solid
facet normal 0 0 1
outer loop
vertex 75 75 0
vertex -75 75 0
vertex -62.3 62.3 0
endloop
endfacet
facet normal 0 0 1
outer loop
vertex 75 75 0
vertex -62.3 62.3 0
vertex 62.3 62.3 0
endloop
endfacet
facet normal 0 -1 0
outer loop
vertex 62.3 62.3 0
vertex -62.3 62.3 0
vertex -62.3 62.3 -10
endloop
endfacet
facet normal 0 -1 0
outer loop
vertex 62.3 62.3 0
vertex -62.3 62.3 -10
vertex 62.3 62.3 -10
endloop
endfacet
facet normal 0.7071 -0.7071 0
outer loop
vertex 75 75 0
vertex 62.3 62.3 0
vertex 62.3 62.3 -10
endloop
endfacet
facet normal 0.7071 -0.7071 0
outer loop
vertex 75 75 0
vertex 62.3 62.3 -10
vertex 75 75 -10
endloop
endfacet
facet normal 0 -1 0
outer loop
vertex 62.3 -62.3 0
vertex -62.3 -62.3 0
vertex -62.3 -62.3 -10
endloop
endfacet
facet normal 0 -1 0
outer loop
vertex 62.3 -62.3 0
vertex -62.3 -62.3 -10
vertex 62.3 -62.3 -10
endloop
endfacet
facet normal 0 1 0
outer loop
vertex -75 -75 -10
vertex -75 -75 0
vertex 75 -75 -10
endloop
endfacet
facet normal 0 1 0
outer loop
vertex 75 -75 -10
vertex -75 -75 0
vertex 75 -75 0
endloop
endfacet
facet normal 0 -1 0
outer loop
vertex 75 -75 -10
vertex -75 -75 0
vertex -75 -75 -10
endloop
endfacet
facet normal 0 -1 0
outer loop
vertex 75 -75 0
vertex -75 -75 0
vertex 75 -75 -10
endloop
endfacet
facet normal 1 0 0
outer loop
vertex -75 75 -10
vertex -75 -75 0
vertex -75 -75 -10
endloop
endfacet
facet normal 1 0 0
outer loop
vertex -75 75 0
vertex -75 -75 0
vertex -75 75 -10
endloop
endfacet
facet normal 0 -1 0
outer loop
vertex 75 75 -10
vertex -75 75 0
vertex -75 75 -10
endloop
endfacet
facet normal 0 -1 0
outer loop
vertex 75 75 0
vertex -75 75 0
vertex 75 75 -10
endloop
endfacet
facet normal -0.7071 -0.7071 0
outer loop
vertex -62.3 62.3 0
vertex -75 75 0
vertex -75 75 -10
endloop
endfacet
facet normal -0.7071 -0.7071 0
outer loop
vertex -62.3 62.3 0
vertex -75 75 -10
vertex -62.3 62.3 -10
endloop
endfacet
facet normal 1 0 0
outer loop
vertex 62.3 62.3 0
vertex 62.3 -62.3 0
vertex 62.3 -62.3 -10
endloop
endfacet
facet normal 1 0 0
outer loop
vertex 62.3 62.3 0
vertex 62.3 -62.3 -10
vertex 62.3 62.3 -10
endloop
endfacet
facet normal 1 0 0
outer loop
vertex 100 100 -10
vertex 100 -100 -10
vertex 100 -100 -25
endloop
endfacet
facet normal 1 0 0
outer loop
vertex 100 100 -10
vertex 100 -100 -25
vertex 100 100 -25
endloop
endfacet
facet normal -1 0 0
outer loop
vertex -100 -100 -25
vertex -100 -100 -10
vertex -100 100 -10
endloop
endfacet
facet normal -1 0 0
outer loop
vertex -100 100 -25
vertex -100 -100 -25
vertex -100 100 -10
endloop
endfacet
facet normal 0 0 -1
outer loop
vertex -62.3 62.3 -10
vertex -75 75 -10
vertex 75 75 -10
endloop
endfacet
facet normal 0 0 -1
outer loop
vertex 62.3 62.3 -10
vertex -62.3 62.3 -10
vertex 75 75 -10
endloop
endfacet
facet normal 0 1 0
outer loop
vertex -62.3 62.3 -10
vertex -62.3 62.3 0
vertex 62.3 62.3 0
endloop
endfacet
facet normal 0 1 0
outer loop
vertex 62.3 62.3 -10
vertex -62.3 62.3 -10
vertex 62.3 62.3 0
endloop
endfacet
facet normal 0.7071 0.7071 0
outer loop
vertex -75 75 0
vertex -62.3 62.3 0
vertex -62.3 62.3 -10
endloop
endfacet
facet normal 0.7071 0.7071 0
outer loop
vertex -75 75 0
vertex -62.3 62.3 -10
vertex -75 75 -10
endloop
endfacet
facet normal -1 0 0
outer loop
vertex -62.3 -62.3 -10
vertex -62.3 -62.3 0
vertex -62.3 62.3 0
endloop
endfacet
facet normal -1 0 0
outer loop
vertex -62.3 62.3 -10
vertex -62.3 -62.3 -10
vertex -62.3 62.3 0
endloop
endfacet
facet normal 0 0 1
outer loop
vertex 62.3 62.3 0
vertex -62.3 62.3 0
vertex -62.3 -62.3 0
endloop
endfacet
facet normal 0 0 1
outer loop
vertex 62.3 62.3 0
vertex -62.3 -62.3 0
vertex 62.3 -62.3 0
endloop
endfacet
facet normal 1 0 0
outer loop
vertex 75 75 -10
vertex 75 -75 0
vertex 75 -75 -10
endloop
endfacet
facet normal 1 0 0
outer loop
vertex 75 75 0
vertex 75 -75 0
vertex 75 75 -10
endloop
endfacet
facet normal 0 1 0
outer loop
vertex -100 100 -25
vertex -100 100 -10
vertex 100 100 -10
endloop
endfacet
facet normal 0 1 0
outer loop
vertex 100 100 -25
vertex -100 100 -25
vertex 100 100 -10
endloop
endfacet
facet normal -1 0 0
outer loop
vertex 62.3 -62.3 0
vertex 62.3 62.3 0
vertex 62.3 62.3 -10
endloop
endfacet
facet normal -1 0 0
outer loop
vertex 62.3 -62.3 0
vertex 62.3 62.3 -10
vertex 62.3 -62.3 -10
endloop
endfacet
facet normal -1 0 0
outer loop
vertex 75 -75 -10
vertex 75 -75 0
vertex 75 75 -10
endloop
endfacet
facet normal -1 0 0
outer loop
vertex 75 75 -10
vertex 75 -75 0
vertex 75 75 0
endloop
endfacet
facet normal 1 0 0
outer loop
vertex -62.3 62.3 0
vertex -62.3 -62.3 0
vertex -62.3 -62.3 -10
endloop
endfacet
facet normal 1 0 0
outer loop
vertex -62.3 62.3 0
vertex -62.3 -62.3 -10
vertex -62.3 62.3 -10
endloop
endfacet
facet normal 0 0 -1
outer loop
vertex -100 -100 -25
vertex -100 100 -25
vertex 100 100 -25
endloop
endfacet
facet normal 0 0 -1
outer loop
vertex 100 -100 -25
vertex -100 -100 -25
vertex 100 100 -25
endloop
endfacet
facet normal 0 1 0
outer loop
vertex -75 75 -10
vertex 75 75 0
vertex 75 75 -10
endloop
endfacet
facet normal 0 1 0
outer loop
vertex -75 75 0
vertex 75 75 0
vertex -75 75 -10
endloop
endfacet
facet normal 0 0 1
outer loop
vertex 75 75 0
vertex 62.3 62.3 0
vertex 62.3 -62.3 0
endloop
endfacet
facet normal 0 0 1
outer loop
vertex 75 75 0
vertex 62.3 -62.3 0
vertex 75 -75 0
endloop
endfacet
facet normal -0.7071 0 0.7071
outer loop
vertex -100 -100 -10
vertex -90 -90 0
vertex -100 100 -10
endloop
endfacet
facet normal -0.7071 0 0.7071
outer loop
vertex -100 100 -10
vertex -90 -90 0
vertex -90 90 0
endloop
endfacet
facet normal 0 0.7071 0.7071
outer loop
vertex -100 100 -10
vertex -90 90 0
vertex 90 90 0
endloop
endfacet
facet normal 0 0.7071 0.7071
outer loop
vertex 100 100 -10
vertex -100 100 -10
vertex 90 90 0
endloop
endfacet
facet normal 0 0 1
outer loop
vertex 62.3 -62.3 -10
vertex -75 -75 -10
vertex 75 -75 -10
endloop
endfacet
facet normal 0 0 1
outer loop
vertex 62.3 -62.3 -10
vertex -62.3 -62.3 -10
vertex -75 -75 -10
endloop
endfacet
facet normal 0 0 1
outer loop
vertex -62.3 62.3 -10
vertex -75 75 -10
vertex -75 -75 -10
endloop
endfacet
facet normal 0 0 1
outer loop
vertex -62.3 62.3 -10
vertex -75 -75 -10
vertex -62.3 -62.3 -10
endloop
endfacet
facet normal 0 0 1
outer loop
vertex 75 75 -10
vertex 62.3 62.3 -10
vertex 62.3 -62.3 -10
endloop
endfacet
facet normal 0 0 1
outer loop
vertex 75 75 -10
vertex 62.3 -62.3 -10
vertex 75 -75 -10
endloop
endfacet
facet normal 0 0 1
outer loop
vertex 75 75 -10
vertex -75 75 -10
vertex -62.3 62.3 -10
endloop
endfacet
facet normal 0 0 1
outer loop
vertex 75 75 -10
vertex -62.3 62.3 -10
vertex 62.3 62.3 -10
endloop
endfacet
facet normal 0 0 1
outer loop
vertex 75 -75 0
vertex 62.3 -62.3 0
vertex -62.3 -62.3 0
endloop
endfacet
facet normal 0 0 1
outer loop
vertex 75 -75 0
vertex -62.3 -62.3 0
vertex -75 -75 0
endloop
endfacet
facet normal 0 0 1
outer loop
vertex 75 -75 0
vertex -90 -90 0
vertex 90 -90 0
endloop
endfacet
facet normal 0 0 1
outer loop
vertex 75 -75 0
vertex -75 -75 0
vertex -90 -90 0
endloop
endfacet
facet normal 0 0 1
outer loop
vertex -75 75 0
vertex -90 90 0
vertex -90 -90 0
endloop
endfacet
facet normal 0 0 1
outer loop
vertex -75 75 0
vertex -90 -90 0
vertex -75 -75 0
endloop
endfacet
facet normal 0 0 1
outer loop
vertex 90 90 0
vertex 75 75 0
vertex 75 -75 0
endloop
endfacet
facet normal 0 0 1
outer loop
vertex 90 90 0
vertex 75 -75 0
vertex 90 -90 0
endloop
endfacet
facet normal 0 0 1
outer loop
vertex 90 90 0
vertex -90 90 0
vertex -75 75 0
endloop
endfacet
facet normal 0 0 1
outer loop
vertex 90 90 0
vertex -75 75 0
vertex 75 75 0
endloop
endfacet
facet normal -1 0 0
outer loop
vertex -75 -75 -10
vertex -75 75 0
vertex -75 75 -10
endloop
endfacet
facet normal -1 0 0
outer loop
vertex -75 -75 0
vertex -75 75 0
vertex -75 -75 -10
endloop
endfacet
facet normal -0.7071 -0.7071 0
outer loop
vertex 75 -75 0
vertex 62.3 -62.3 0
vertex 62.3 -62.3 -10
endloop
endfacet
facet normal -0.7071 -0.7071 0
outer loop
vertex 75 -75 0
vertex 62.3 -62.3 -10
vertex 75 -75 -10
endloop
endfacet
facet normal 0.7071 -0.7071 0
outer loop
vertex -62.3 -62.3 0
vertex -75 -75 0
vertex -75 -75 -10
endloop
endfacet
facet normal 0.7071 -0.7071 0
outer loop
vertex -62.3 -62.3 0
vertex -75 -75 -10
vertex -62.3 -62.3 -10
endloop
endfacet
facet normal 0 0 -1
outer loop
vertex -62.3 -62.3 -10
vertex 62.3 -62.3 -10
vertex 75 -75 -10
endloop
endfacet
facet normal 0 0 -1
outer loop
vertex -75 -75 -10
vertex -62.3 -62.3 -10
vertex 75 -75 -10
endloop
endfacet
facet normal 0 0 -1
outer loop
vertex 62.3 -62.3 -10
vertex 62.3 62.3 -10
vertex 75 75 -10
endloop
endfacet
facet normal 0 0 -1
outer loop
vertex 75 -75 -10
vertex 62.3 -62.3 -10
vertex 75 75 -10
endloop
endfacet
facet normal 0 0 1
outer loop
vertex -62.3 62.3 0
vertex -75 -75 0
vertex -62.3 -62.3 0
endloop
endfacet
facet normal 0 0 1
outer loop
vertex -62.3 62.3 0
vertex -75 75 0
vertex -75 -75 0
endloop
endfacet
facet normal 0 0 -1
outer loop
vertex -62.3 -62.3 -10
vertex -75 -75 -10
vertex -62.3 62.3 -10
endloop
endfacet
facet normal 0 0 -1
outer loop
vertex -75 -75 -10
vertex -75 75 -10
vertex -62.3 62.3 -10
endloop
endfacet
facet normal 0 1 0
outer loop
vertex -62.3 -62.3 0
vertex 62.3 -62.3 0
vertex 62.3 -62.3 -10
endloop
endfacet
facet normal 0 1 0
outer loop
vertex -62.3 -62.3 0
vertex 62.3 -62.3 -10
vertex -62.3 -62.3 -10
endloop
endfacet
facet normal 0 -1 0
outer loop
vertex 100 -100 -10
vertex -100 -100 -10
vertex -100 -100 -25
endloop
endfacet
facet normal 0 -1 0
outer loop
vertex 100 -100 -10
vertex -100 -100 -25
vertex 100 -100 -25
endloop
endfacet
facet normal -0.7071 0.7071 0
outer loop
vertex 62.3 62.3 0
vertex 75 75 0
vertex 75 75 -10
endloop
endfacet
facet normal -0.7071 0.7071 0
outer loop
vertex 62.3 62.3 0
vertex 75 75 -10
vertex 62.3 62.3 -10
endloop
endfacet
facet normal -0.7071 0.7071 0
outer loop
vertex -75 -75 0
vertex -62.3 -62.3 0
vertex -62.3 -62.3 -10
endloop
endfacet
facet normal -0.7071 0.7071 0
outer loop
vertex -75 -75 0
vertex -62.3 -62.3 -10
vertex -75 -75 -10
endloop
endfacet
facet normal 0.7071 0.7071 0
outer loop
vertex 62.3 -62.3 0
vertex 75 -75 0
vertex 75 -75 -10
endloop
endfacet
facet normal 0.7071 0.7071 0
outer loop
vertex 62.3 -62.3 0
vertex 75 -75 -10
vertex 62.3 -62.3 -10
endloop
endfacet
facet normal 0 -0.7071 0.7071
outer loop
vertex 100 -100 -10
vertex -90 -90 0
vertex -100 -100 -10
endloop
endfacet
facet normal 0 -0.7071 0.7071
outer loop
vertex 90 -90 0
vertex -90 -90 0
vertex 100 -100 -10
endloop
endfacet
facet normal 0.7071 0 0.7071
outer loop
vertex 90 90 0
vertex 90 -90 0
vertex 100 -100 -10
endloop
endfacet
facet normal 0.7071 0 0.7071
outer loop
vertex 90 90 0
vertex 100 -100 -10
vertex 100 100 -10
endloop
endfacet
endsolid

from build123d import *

# Parameters (mm, degrees)
F0_W     = 200
F0_H     = 200
F1_DEPTH = 25
F2_SIZE  = 10
F3_W     = 150
F3_H     = 150
F3_W_2   = 124.6
F3_H_2   = 124.6
F4_DEPTH = 10
F6_DEPTH = 10
F7_DEPTH = 10
F8_DEPTH = 10
F9_DEPTH = 10


with BuildPart() as f1:
    # F0 (on Top) → F1 (new body)
    with BuildSketch(Plane.XY):
        Rectangle(F0_W, F0_H)
    extrude(amount=-F1_DEPTH)

    # F2
    f2_edges = [f1.edges().sort_by_distance(p)[0] for p in [
        (-100, 0, 0),
        (0, 100, 0),
        (0, -100, 0),
        (100, 0, 0),
    ]]
    chamfer(f2_edges, length=F2_SIZE)

    # F3 (on face) → F4 (cut)
    with BuildSketch(Plane.XY):
        Rectangle(F3_W, F3_H)
        Rectangle(F3_W_2, F3_H_2, mode=Mode.SUBTRACT)
    extrude(amount=-F4_DEPTH, mode=Mode.SUBTRACT)


with BuildPart() as f6:
    # F5 (on face) → F6 (new body, through all)
    with BuildSketch(Plane.XY):
        Polygon((-75, -75), (-62.3, -62.3), (-62.3, 62.3), (-75, 75), align=None)
    extrude(amount=-F6_DEPTH)


with BuildPart() as f7:
    # F5 (on face) → F7 (new body, through all)
    with BuildSketch(Plane.XY):
        Polygon((62.3, -62.3), (-62.3, -62.3), (-75, -75), (75, -75), align=None)
    extrude(amount=-F7_DEPTH)


with BuildPart() as f8:
    # F5 (on face) → F8 (new body, through all)
    with BuildSketch(Plane.XY):
        Polygon((62.3, 62.3), (62.3, -62.3), (75, -75), (75, 75), align=None)
    extrude(amount=-F8_DEPTH)


with BuildPart() as f9:
    # F5 (on face) → F9 (new body, through all)
    with BuildSketch(Plane.XY):
        Polygon((-75, 75), (-62.3, 62.3), (62.3, 62.3), (75, 75), align=None)
    extrude(amount=-F9_DEPTH)


solid = Compound([f1.part, f6.part, f7.part, f8.part, f9.part])
